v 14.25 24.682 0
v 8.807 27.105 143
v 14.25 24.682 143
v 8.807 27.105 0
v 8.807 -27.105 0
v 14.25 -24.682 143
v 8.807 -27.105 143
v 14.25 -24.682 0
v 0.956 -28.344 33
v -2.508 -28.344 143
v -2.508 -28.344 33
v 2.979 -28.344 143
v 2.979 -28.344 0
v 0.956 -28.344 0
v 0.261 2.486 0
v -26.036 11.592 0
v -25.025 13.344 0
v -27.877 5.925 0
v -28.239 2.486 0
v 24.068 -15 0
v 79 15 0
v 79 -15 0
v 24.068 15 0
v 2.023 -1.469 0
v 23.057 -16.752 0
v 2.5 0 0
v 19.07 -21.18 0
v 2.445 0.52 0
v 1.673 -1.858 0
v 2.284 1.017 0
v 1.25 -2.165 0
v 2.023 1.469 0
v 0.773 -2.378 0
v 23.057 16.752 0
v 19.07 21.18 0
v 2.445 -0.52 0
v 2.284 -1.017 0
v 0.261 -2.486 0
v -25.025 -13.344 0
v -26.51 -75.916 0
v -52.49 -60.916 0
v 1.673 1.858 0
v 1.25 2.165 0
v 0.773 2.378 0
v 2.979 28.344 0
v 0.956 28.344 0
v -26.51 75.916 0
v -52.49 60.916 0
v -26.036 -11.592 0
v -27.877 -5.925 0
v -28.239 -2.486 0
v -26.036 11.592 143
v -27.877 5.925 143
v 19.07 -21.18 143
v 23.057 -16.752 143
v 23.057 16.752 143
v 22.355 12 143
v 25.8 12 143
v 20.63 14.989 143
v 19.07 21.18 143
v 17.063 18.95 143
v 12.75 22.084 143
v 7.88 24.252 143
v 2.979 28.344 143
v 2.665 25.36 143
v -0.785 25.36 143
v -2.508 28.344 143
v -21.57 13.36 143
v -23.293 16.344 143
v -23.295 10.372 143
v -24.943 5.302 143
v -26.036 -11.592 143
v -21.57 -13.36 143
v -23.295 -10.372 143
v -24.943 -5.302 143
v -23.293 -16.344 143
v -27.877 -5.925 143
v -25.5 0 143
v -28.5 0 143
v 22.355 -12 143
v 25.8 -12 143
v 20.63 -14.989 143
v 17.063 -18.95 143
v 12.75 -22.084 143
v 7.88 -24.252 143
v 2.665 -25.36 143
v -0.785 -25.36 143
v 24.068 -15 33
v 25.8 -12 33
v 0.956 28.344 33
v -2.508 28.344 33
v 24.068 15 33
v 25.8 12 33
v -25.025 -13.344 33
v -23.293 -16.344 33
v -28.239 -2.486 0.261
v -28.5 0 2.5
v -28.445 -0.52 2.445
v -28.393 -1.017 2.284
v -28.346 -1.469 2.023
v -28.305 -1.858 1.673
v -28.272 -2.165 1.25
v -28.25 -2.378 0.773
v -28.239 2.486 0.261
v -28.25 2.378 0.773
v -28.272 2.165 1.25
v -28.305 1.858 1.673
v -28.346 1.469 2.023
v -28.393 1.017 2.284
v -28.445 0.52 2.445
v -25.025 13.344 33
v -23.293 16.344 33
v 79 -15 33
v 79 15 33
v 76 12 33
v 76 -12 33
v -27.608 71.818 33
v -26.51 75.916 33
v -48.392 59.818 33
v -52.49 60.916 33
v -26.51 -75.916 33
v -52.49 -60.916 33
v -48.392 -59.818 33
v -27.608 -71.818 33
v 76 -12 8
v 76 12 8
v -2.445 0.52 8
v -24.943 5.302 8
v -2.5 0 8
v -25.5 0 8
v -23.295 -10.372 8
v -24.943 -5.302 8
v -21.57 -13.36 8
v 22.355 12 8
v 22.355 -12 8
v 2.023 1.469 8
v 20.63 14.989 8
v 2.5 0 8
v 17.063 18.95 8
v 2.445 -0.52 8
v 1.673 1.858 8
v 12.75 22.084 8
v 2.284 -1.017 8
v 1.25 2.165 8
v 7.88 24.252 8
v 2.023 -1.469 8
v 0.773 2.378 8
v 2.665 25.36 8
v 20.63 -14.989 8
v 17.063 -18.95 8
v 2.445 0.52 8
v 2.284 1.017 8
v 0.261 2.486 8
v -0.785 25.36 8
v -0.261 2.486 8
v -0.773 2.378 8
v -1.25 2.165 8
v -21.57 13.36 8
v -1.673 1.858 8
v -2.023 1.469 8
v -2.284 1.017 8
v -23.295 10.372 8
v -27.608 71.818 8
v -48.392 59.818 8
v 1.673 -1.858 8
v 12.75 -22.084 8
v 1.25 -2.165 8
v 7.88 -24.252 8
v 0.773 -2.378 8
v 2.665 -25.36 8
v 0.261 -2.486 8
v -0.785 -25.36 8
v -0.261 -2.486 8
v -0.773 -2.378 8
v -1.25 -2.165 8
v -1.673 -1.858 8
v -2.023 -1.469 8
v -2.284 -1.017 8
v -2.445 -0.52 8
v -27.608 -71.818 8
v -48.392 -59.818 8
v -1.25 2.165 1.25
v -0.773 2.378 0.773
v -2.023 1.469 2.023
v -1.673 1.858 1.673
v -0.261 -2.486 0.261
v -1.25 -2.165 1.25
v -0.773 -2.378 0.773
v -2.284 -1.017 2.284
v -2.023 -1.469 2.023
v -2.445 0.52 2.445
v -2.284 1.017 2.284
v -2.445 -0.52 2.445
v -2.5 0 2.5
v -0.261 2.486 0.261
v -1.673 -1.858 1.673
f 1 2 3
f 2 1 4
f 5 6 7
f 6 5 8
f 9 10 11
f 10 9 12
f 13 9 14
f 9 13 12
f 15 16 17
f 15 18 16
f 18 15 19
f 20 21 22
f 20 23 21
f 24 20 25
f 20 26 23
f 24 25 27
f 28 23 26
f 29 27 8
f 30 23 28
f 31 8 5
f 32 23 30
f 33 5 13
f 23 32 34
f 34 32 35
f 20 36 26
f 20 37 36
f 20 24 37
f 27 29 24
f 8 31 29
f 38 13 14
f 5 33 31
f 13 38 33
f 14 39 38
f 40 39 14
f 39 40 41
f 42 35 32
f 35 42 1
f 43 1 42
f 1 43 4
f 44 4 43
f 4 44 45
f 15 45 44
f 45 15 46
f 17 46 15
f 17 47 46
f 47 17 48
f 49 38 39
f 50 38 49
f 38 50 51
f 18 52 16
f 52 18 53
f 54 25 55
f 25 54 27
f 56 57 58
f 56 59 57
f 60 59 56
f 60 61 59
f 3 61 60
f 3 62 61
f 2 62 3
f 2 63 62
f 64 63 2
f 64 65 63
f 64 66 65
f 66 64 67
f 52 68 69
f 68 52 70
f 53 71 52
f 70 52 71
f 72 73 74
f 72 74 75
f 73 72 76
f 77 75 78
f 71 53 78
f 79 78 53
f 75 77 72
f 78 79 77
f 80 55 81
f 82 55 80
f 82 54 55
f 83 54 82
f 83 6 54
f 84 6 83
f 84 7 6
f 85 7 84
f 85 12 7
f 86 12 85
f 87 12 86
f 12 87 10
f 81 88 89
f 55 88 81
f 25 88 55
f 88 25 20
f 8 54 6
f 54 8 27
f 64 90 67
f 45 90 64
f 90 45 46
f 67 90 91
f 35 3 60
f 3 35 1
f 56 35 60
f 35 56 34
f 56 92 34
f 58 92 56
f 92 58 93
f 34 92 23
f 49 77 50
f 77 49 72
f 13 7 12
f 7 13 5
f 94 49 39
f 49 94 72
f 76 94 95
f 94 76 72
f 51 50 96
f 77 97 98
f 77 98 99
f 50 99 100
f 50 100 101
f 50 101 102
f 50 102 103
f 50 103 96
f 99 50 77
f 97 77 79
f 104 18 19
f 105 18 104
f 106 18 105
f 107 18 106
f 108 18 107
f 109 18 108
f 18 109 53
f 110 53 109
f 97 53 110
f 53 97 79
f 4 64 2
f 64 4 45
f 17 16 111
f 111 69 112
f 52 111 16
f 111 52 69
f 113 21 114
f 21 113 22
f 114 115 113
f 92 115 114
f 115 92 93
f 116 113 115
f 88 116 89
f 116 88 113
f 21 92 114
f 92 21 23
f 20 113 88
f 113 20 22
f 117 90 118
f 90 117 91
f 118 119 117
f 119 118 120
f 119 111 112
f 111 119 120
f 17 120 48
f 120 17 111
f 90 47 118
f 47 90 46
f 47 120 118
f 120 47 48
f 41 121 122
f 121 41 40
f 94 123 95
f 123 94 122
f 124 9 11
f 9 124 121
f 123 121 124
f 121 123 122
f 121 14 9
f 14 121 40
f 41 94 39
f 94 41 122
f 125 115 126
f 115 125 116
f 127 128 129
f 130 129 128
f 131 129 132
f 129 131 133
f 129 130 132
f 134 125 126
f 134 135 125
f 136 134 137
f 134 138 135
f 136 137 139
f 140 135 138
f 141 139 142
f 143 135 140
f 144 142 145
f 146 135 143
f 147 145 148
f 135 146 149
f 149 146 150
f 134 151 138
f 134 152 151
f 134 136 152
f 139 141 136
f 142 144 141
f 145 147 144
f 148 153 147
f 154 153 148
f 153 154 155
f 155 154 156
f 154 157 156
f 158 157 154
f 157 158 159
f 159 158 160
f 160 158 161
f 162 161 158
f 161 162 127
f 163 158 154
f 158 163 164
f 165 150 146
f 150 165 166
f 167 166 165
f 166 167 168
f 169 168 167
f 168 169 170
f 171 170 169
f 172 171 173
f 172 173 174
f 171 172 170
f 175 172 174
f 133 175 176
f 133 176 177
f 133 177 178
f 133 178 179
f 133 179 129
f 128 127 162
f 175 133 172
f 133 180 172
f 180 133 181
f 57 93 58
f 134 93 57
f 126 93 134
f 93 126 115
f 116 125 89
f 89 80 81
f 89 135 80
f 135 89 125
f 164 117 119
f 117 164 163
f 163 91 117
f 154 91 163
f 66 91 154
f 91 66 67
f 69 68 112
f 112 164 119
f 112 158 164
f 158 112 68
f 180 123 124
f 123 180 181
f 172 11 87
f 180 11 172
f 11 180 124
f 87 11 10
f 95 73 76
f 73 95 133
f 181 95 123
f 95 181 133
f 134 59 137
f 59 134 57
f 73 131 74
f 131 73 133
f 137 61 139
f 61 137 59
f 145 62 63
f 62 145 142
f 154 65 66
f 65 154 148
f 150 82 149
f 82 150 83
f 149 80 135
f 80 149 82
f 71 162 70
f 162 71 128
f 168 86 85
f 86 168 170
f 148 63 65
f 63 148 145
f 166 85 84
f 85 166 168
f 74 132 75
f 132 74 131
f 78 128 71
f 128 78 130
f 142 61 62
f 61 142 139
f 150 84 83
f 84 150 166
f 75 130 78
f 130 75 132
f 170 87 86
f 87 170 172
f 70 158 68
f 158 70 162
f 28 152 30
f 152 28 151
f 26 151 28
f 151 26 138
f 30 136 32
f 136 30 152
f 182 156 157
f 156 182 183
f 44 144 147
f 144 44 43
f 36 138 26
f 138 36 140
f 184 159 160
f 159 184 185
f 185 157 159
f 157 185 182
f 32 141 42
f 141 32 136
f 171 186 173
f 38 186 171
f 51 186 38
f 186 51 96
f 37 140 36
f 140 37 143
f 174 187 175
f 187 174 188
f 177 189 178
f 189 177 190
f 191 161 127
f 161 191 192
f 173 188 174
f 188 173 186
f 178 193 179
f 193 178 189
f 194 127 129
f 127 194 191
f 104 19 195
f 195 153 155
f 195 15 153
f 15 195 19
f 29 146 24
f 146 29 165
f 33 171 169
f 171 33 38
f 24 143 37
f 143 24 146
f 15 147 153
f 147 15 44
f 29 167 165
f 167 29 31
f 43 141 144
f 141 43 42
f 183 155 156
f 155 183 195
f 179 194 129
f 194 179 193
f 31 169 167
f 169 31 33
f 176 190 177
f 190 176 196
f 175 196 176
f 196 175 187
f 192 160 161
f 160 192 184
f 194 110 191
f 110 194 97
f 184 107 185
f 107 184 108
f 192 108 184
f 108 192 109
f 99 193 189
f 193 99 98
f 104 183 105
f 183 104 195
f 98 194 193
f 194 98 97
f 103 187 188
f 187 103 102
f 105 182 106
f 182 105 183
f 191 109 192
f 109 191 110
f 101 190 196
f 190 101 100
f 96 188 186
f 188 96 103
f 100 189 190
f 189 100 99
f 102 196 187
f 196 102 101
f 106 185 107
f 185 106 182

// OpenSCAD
//////////////////////////////////////////////
//  ***TeMoG - Tentacle Mold Generator***   //
//  by Jonas Jørgensen (jonj@sdu.dk) 2020   //
//                                          //
//  Shared under a Creative Commons         //
//  Attribution-ShareAlike (CC BY-SA 3.0)   //
//  license                                 //
//////////////////////////////////////////////

//Part 4a - Finishing Mold - standard version

$fn=30; //Set to 200 when generating the molds for 3D printing

//Main cone and mold
h = 180; //Cone height
maxDiam = 45; //Cone
minDiam = 35; //Cone
centerSolidDiam=15;
moldWallThickness = 3;
footDiam=100; //Foot for mold
siliconeThickness=3; //Outer
dividersThickness = 5;

//Bottom
straightHeightBottom = 20;
bottomThickness=3.5;
LDRHolderThickness = 8 +2.5;
LDRHolderDiam= minDiam+3;
delta=0.4; //Inaccuracy of printer (layering and overextrusion)
LDRHoleDepth=8;
LDRDiam=6;
LDRWireHolesDist=3;
LDRHoleDist=LDRHolderDiam/2-LDRDiam;
LDRNumber=3;

//Top part
straightHeight= 30; 
wiresDiameter=5; 

//Joints
jointThickness = 3;

//Finishing mold:
finMoldHeight=25;
finMoldWidth=30;
supportMoldLength=60;
supportMoldWidth=30;
FinalBottomThickness =8;

union() {


//Main cone
difference(){

union() {
cylinder(h*(3/4)+FinalBottomThickness,d2=maxDiam+moldWallThickness*4,d1=maxDiam+moldWallThickness*4); //Solid cylinder
translate([(maxDiam+moldWallThickness*4)/3,-supportMoldWidth/2,0]) cube([supportMoldLength,supportMoldWidth,finMoldHeight+FinalBottomThickness]);//Solid cube 1
rotate (120) translate([(maxDiam+moldWallThickness*4)/3,-supportMoldWidth/2,0]) cube([supportMoldLength,supportMoldWidth,finMoldHeight+FinalBottomThickness]);//Solid cube 2
rotate (240) translate([(maxDiam+moldWallThickness*4)/3,-supportMoldWidth/2,0]) cube([supportMoldLength,supportMoldWidth,finMoldHeight+FinalBottomThickness]);//Solid cube 3

    }
    
translate([0,0,FinalBottomThickness]) {
    translate([(maxDiam+moldWallThickness*4)/3+moldWallThickness,-supportMoldWidth/2+moldWallThickness,0]) cube([supportMoldLength-moldWallThickness*2,supportMoldWidth-moldWallThickness*2,h+FinalBottomThickness]); //Erase cube 1
    
rotate (120) translate([(maxDiam+moldWallThickness*4)/3+moldWallThickness,-supportMoldWidth/2+moldWallThickness,0]) cube([supportMoldLength-moldWallThickness*2,supportMoldWidth-moldWallThickness*2,h+FinalBottomThickness]); //Erase cube 2

rotate (240) translate([(maxDiam+moldWallThickness*4)/3+moldWallThickness,-supportMoldWidth/2+moldWallThickness,0]) cube([supportMoldLength-moldWallThickness*2,supportMoldWidth-moldWallThickness*2,h+FinalBottomThickness]); //Erase cube 3


cylinder(h+FinalBottomThickness,d2=maxDiam+moldWallThickness*2,d1=maxDiam+moldWallThickness*2); //Erase cylinder


}
cylinder(FinalBottomThickness,d1=wiresDiameter,d2=wiresDiameter); //Make hole for wires

rotate(270, [0,1,0]) cylinder(finMoldWidth,d1=wiresDiameter,d2=wiresDiameter); //Make SLIT for wires
}

}
